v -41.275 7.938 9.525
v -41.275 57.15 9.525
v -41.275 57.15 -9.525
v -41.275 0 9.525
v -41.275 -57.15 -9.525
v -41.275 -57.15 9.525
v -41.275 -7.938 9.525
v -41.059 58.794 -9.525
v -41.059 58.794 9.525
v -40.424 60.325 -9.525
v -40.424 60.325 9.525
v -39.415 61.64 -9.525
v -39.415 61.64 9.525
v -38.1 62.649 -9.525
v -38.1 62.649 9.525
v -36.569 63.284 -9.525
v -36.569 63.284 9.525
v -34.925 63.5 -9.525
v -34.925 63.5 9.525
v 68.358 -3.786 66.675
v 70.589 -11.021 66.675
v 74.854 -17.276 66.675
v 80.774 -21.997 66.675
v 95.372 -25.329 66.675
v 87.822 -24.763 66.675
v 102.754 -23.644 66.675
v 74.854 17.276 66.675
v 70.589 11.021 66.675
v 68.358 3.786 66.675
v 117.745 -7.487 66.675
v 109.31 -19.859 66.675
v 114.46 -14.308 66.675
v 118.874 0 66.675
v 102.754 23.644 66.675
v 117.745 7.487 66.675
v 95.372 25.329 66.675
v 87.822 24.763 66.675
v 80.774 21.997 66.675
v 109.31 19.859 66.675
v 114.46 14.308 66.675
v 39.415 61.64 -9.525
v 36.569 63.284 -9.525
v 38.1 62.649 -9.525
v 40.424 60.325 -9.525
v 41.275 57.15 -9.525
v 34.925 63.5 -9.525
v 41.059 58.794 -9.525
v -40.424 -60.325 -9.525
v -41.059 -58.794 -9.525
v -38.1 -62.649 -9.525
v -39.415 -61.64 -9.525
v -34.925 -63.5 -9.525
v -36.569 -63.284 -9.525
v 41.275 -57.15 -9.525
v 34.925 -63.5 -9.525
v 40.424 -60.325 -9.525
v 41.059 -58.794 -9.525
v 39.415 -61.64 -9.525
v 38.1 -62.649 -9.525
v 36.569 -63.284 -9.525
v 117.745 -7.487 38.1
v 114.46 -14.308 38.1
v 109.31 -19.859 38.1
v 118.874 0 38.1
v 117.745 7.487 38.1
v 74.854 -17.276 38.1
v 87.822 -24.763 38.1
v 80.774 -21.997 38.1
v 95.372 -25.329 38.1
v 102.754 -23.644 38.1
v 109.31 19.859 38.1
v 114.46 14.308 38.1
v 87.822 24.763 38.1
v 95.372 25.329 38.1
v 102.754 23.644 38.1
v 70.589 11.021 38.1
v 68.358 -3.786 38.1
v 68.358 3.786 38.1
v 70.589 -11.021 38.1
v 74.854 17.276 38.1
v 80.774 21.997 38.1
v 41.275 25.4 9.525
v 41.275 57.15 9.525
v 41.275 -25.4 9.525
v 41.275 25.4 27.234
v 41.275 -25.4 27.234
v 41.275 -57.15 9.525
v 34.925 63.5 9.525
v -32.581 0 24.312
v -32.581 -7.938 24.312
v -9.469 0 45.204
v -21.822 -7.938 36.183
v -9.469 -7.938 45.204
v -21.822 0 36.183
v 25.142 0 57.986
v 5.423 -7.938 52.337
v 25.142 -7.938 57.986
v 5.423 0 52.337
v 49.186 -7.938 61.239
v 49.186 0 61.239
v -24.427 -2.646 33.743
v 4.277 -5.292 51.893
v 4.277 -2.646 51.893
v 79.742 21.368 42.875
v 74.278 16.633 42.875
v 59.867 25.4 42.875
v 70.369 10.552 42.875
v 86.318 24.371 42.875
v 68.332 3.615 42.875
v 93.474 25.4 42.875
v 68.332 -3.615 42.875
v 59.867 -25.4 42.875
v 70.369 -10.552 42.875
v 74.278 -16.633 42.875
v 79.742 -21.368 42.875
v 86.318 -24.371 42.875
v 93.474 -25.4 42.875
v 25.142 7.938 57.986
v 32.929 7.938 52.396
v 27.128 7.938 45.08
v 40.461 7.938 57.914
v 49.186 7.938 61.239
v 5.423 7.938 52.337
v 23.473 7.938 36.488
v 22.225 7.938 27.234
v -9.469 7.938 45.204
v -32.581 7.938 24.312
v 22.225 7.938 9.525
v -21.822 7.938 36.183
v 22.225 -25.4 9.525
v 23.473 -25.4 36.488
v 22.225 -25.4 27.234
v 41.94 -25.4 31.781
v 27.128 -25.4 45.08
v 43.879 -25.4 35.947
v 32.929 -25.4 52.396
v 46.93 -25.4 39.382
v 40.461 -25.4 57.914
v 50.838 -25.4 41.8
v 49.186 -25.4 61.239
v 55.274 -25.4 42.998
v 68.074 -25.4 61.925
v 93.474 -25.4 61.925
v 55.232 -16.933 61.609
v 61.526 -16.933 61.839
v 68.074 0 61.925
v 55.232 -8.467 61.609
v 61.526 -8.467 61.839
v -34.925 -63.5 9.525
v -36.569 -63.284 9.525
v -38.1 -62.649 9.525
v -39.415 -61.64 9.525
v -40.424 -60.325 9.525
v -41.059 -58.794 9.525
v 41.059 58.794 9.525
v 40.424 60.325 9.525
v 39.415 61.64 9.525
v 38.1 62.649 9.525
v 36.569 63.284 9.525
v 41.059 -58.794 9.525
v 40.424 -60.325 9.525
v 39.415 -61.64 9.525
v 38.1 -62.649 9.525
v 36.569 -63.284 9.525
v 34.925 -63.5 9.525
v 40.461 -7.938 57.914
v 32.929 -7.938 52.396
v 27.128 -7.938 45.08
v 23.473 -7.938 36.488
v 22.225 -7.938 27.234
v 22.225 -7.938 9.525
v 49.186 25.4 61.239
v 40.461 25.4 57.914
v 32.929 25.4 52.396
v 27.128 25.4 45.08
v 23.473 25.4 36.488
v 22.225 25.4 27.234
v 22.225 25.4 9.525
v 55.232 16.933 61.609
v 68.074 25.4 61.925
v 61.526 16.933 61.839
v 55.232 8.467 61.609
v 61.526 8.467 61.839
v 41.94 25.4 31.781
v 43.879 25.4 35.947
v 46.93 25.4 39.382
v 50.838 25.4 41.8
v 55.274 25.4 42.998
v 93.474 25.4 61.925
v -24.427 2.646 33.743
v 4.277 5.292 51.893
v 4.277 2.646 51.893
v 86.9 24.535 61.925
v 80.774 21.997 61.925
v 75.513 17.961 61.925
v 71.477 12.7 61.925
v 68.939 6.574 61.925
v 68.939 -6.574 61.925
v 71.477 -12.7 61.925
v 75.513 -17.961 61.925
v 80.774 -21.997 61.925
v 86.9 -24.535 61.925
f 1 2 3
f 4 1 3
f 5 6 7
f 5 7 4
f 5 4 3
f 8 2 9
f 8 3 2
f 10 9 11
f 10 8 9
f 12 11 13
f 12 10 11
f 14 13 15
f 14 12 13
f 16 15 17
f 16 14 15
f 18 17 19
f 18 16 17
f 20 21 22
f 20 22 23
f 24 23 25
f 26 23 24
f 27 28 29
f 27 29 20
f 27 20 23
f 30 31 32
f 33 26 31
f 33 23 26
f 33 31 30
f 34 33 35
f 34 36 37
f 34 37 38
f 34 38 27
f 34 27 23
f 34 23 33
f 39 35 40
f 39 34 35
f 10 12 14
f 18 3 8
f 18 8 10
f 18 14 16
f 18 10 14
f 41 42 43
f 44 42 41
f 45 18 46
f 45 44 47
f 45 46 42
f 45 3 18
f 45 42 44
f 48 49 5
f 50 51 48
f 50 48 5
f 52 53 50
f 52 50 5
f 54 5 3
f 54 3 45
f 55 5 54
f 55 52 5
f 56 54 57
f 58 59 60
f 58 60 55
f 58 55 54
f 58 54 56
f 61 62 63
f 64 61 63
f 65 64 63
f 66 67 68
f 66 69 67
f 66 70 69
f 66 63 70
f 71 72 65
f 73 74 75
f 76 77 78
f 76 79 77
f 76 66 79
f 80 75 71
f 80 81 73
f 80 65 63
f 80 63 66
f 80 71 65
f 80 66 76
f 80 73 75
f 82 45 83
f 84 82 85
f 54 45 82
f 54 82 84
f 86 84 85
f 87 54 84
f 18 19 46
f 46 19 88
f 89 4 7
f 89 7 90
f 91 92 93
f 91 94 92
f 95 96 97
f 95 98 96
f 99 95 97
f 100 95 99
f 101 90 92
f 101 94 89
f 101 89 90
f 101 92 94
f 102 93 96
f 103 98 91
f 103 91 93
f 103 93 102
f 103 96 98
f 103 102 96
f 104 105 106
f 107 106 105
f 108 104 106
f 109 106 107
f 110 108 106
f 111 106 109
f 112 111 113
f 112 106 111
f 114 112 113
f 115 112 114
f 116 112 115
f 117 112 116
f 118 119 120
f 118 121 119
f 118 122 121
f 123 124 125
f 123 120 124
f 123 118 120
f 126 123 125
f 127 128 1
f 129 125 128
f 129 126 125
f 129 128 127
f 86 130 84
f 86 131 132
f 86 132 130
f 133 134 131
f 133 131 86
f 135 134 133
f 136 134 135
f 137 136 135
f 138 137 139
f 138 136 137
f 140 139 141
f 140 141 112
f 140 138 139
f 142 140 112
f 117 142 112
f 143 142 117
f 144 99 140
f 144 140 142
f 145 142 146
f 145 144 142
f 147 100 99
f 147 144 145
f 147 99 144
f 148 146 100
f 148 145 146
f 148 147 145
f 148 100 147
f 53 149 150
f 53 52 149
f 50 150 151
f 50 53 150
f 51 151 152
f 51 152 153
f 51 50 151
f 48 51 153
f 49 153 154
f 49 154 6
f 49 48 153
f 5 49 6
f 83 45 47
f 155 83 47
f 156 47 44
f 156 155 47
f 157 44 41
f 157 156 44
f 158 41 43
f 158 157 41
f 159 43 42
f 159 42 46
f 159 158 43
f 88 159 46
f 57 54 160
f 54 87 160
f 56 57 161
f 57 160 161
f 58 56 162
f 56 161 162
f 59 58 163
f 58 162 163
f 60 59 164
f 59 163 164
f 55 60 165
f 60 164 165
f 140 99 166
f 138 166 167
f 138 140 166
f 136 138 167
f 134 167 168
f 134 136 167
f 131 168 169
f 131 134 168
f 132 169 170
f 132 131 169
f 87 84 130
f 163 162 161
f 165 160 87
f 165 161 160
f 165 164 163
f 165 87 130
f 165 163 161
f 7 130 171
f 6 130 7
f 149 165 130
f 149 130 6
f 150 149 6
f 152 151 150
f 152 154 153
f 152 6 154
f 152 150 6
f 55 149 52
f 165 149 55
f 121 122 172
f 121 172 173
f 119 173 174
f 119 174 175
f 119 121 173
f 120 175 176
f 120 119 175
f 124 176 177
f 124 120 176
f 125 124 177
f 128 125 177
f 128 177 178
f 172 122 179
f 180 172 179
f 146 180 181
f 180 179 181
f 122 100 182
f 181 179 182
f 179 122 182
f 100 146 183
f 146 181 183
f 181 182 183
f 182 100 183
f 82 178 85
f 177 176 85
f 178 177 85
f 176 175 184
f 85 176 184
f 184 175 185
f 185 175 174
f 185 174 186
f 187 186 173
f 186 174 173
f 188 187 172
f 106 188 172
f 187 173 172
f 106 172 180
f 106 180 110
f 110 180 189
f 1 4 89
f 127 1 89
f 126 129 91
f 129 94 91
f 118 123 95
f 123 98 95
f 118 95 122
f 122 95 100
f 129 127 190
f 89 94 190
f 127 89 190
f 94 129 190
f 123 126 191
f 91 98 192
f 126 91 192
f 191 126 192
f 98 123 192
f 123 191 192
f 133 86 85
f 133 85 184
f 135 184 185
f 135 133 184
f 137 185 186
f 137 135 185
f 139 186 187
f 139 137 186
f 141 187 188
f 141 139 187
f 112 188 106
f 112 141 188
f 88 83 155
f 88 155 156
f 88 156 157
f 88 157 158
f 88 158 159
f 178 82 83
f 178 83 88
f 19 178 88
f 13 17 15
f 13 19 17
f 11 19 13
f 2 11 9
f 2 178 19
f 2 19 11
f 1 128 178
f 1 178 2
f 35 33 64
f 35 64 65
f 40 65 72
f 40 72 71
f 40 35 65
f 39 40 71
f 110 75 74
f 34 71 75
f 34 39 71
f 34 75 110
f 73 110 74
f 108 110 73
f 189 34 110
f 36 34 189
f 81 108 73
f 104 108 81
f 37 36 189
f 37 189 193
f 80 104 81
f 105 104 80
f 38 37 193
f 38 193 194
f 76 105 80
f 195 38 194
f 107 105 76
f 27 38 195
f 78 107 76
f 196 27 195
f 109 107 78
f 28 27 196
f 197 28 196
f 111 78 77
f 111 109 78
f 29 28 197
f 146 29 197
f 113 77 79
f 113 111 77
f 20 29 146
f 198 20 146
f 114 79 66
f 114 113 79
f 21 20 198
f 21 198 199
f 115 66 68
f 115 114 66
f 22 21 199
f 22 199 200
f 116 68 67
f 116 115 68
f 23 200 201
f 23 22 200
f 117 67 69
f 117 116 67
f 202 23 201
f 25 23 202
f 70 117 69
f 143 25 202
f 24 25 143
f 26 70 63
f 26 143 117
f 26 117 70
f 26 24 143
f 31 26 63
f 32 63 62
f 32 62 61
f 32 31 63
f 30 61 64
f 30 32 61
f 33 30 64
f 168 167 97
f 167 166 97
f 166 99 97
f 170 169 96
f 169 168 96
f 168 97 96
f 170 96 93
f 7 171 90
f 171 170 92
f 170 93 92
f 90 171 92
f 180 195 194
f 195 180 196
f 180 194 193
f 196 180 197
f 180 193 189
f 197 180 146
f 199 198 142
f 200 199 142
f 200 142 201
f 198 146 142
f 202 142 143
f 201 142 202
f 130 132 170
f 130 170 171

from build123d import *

# Parameters (mm, degrees)
F1_DEPTH = 63.5
F0_W     = 25.4
F0_H     = 19.05
F2_DEPTH = 25.4
F3_DEPTH = 7.9375
F5_R     = 6.35


with BuildPart() as f1:
    # F0 (on Front) → F1 (new body, symmetric)
    with BuildSketch(Plane.XZ):
        Polygon((-41.275, 9.525), (-41.275, -9.525), (41.275, -9.525), (41.275, 9.525), (22.225, 9.525), align=None)
    extrude(amount=F1_DEPTH, both=True)

    # F0 (on Front) → F2 (join, symmetric)
    with BuildSketch(Plane.XZ):
        with BuildLine():
            Line((22.225, 9.525), (41.275, 9.525))
            Line((41.275, 9.525), (41.275, 27.234414))
            ThreePointArc((41.275, 27.234414), (46.930285, 39.382379), (59.86688, 42.8752))
            Line((59.86688, 42.8752), (68.073841, 42.8752))
            Line((68.073841, 42.8752), (68.073841, 61.9252))
            add(Edge.make_bspline(
                [(49.186449, 61.239376), (55.109251, 61.677968), (61.396661, 61.911853), (68.073841, 61.9252)],
                knots=[109.362074, 109.362074, 109.362074, 109.362074, 121.255722, 121.255722, 121.255722, 121.255722], degree=3))
            ThreePointArc((49.186449, 61.239376), (29.783208, 48.93267), (22.225, 27.234414))
            Line((22.225, 27.234414), (22.225, 9.525))
        make_face()
        with Locations((80.773841, 52.4002)):
            Rectangle(F0_W, F0_H)
    extrude(amount=F2_DEPTH, both=True)

    # F0 (on Front) → F3 (join, symmetric)
    with BuildSketch(Plane.XZ):
        with BuildLine():
            add(Edge.make_bspline(
                [(-41.275, 9.525), (-28.906992, 35.866078), (-5.273707, 57.206524), (49.186449, 61.239376)],
                knots=[0, 0, 0, 0, 109.362074, 109.362074, 109.362074, 109.362074], degree=3))
            Line((-41.275, 9.525), (22.225, 9.525))
            Line((22.225, 9.525), (22.225, 27.234414))
            ThreePointArc((22.225, 27.234414), (29.783208, 48.93267), (49.186449, 61.239376))
        make_face()
    extrude(amount=F3_DEPTH, both=True)

    # F0 (on Front) → F4 (revolve)
    with BuildSketch(Plane.XZ):
        Polygon((93.473841, 66.675), (93.473841, 61.9252), (93.473841, 42.8752), (93.473841, 38.1), (118.873841, 38.1), (118.873841, 66.675), align=None)
    revolve(axis=Axis((93.473841, 0, 52.3875), (0, 0, 1)))

    # F5
    f5_edges = [f1.edges().sort_by_distance(p)[0] for p in [
        (-41.275, -63.5, 0),
        (41.275, -63.5, 0),
        (41.275, 63.5, 0),
        (-41.275, 63.5, 0),
    ]]
    fillet(f5_edges, radius=F5_R)


solid = f1.part
